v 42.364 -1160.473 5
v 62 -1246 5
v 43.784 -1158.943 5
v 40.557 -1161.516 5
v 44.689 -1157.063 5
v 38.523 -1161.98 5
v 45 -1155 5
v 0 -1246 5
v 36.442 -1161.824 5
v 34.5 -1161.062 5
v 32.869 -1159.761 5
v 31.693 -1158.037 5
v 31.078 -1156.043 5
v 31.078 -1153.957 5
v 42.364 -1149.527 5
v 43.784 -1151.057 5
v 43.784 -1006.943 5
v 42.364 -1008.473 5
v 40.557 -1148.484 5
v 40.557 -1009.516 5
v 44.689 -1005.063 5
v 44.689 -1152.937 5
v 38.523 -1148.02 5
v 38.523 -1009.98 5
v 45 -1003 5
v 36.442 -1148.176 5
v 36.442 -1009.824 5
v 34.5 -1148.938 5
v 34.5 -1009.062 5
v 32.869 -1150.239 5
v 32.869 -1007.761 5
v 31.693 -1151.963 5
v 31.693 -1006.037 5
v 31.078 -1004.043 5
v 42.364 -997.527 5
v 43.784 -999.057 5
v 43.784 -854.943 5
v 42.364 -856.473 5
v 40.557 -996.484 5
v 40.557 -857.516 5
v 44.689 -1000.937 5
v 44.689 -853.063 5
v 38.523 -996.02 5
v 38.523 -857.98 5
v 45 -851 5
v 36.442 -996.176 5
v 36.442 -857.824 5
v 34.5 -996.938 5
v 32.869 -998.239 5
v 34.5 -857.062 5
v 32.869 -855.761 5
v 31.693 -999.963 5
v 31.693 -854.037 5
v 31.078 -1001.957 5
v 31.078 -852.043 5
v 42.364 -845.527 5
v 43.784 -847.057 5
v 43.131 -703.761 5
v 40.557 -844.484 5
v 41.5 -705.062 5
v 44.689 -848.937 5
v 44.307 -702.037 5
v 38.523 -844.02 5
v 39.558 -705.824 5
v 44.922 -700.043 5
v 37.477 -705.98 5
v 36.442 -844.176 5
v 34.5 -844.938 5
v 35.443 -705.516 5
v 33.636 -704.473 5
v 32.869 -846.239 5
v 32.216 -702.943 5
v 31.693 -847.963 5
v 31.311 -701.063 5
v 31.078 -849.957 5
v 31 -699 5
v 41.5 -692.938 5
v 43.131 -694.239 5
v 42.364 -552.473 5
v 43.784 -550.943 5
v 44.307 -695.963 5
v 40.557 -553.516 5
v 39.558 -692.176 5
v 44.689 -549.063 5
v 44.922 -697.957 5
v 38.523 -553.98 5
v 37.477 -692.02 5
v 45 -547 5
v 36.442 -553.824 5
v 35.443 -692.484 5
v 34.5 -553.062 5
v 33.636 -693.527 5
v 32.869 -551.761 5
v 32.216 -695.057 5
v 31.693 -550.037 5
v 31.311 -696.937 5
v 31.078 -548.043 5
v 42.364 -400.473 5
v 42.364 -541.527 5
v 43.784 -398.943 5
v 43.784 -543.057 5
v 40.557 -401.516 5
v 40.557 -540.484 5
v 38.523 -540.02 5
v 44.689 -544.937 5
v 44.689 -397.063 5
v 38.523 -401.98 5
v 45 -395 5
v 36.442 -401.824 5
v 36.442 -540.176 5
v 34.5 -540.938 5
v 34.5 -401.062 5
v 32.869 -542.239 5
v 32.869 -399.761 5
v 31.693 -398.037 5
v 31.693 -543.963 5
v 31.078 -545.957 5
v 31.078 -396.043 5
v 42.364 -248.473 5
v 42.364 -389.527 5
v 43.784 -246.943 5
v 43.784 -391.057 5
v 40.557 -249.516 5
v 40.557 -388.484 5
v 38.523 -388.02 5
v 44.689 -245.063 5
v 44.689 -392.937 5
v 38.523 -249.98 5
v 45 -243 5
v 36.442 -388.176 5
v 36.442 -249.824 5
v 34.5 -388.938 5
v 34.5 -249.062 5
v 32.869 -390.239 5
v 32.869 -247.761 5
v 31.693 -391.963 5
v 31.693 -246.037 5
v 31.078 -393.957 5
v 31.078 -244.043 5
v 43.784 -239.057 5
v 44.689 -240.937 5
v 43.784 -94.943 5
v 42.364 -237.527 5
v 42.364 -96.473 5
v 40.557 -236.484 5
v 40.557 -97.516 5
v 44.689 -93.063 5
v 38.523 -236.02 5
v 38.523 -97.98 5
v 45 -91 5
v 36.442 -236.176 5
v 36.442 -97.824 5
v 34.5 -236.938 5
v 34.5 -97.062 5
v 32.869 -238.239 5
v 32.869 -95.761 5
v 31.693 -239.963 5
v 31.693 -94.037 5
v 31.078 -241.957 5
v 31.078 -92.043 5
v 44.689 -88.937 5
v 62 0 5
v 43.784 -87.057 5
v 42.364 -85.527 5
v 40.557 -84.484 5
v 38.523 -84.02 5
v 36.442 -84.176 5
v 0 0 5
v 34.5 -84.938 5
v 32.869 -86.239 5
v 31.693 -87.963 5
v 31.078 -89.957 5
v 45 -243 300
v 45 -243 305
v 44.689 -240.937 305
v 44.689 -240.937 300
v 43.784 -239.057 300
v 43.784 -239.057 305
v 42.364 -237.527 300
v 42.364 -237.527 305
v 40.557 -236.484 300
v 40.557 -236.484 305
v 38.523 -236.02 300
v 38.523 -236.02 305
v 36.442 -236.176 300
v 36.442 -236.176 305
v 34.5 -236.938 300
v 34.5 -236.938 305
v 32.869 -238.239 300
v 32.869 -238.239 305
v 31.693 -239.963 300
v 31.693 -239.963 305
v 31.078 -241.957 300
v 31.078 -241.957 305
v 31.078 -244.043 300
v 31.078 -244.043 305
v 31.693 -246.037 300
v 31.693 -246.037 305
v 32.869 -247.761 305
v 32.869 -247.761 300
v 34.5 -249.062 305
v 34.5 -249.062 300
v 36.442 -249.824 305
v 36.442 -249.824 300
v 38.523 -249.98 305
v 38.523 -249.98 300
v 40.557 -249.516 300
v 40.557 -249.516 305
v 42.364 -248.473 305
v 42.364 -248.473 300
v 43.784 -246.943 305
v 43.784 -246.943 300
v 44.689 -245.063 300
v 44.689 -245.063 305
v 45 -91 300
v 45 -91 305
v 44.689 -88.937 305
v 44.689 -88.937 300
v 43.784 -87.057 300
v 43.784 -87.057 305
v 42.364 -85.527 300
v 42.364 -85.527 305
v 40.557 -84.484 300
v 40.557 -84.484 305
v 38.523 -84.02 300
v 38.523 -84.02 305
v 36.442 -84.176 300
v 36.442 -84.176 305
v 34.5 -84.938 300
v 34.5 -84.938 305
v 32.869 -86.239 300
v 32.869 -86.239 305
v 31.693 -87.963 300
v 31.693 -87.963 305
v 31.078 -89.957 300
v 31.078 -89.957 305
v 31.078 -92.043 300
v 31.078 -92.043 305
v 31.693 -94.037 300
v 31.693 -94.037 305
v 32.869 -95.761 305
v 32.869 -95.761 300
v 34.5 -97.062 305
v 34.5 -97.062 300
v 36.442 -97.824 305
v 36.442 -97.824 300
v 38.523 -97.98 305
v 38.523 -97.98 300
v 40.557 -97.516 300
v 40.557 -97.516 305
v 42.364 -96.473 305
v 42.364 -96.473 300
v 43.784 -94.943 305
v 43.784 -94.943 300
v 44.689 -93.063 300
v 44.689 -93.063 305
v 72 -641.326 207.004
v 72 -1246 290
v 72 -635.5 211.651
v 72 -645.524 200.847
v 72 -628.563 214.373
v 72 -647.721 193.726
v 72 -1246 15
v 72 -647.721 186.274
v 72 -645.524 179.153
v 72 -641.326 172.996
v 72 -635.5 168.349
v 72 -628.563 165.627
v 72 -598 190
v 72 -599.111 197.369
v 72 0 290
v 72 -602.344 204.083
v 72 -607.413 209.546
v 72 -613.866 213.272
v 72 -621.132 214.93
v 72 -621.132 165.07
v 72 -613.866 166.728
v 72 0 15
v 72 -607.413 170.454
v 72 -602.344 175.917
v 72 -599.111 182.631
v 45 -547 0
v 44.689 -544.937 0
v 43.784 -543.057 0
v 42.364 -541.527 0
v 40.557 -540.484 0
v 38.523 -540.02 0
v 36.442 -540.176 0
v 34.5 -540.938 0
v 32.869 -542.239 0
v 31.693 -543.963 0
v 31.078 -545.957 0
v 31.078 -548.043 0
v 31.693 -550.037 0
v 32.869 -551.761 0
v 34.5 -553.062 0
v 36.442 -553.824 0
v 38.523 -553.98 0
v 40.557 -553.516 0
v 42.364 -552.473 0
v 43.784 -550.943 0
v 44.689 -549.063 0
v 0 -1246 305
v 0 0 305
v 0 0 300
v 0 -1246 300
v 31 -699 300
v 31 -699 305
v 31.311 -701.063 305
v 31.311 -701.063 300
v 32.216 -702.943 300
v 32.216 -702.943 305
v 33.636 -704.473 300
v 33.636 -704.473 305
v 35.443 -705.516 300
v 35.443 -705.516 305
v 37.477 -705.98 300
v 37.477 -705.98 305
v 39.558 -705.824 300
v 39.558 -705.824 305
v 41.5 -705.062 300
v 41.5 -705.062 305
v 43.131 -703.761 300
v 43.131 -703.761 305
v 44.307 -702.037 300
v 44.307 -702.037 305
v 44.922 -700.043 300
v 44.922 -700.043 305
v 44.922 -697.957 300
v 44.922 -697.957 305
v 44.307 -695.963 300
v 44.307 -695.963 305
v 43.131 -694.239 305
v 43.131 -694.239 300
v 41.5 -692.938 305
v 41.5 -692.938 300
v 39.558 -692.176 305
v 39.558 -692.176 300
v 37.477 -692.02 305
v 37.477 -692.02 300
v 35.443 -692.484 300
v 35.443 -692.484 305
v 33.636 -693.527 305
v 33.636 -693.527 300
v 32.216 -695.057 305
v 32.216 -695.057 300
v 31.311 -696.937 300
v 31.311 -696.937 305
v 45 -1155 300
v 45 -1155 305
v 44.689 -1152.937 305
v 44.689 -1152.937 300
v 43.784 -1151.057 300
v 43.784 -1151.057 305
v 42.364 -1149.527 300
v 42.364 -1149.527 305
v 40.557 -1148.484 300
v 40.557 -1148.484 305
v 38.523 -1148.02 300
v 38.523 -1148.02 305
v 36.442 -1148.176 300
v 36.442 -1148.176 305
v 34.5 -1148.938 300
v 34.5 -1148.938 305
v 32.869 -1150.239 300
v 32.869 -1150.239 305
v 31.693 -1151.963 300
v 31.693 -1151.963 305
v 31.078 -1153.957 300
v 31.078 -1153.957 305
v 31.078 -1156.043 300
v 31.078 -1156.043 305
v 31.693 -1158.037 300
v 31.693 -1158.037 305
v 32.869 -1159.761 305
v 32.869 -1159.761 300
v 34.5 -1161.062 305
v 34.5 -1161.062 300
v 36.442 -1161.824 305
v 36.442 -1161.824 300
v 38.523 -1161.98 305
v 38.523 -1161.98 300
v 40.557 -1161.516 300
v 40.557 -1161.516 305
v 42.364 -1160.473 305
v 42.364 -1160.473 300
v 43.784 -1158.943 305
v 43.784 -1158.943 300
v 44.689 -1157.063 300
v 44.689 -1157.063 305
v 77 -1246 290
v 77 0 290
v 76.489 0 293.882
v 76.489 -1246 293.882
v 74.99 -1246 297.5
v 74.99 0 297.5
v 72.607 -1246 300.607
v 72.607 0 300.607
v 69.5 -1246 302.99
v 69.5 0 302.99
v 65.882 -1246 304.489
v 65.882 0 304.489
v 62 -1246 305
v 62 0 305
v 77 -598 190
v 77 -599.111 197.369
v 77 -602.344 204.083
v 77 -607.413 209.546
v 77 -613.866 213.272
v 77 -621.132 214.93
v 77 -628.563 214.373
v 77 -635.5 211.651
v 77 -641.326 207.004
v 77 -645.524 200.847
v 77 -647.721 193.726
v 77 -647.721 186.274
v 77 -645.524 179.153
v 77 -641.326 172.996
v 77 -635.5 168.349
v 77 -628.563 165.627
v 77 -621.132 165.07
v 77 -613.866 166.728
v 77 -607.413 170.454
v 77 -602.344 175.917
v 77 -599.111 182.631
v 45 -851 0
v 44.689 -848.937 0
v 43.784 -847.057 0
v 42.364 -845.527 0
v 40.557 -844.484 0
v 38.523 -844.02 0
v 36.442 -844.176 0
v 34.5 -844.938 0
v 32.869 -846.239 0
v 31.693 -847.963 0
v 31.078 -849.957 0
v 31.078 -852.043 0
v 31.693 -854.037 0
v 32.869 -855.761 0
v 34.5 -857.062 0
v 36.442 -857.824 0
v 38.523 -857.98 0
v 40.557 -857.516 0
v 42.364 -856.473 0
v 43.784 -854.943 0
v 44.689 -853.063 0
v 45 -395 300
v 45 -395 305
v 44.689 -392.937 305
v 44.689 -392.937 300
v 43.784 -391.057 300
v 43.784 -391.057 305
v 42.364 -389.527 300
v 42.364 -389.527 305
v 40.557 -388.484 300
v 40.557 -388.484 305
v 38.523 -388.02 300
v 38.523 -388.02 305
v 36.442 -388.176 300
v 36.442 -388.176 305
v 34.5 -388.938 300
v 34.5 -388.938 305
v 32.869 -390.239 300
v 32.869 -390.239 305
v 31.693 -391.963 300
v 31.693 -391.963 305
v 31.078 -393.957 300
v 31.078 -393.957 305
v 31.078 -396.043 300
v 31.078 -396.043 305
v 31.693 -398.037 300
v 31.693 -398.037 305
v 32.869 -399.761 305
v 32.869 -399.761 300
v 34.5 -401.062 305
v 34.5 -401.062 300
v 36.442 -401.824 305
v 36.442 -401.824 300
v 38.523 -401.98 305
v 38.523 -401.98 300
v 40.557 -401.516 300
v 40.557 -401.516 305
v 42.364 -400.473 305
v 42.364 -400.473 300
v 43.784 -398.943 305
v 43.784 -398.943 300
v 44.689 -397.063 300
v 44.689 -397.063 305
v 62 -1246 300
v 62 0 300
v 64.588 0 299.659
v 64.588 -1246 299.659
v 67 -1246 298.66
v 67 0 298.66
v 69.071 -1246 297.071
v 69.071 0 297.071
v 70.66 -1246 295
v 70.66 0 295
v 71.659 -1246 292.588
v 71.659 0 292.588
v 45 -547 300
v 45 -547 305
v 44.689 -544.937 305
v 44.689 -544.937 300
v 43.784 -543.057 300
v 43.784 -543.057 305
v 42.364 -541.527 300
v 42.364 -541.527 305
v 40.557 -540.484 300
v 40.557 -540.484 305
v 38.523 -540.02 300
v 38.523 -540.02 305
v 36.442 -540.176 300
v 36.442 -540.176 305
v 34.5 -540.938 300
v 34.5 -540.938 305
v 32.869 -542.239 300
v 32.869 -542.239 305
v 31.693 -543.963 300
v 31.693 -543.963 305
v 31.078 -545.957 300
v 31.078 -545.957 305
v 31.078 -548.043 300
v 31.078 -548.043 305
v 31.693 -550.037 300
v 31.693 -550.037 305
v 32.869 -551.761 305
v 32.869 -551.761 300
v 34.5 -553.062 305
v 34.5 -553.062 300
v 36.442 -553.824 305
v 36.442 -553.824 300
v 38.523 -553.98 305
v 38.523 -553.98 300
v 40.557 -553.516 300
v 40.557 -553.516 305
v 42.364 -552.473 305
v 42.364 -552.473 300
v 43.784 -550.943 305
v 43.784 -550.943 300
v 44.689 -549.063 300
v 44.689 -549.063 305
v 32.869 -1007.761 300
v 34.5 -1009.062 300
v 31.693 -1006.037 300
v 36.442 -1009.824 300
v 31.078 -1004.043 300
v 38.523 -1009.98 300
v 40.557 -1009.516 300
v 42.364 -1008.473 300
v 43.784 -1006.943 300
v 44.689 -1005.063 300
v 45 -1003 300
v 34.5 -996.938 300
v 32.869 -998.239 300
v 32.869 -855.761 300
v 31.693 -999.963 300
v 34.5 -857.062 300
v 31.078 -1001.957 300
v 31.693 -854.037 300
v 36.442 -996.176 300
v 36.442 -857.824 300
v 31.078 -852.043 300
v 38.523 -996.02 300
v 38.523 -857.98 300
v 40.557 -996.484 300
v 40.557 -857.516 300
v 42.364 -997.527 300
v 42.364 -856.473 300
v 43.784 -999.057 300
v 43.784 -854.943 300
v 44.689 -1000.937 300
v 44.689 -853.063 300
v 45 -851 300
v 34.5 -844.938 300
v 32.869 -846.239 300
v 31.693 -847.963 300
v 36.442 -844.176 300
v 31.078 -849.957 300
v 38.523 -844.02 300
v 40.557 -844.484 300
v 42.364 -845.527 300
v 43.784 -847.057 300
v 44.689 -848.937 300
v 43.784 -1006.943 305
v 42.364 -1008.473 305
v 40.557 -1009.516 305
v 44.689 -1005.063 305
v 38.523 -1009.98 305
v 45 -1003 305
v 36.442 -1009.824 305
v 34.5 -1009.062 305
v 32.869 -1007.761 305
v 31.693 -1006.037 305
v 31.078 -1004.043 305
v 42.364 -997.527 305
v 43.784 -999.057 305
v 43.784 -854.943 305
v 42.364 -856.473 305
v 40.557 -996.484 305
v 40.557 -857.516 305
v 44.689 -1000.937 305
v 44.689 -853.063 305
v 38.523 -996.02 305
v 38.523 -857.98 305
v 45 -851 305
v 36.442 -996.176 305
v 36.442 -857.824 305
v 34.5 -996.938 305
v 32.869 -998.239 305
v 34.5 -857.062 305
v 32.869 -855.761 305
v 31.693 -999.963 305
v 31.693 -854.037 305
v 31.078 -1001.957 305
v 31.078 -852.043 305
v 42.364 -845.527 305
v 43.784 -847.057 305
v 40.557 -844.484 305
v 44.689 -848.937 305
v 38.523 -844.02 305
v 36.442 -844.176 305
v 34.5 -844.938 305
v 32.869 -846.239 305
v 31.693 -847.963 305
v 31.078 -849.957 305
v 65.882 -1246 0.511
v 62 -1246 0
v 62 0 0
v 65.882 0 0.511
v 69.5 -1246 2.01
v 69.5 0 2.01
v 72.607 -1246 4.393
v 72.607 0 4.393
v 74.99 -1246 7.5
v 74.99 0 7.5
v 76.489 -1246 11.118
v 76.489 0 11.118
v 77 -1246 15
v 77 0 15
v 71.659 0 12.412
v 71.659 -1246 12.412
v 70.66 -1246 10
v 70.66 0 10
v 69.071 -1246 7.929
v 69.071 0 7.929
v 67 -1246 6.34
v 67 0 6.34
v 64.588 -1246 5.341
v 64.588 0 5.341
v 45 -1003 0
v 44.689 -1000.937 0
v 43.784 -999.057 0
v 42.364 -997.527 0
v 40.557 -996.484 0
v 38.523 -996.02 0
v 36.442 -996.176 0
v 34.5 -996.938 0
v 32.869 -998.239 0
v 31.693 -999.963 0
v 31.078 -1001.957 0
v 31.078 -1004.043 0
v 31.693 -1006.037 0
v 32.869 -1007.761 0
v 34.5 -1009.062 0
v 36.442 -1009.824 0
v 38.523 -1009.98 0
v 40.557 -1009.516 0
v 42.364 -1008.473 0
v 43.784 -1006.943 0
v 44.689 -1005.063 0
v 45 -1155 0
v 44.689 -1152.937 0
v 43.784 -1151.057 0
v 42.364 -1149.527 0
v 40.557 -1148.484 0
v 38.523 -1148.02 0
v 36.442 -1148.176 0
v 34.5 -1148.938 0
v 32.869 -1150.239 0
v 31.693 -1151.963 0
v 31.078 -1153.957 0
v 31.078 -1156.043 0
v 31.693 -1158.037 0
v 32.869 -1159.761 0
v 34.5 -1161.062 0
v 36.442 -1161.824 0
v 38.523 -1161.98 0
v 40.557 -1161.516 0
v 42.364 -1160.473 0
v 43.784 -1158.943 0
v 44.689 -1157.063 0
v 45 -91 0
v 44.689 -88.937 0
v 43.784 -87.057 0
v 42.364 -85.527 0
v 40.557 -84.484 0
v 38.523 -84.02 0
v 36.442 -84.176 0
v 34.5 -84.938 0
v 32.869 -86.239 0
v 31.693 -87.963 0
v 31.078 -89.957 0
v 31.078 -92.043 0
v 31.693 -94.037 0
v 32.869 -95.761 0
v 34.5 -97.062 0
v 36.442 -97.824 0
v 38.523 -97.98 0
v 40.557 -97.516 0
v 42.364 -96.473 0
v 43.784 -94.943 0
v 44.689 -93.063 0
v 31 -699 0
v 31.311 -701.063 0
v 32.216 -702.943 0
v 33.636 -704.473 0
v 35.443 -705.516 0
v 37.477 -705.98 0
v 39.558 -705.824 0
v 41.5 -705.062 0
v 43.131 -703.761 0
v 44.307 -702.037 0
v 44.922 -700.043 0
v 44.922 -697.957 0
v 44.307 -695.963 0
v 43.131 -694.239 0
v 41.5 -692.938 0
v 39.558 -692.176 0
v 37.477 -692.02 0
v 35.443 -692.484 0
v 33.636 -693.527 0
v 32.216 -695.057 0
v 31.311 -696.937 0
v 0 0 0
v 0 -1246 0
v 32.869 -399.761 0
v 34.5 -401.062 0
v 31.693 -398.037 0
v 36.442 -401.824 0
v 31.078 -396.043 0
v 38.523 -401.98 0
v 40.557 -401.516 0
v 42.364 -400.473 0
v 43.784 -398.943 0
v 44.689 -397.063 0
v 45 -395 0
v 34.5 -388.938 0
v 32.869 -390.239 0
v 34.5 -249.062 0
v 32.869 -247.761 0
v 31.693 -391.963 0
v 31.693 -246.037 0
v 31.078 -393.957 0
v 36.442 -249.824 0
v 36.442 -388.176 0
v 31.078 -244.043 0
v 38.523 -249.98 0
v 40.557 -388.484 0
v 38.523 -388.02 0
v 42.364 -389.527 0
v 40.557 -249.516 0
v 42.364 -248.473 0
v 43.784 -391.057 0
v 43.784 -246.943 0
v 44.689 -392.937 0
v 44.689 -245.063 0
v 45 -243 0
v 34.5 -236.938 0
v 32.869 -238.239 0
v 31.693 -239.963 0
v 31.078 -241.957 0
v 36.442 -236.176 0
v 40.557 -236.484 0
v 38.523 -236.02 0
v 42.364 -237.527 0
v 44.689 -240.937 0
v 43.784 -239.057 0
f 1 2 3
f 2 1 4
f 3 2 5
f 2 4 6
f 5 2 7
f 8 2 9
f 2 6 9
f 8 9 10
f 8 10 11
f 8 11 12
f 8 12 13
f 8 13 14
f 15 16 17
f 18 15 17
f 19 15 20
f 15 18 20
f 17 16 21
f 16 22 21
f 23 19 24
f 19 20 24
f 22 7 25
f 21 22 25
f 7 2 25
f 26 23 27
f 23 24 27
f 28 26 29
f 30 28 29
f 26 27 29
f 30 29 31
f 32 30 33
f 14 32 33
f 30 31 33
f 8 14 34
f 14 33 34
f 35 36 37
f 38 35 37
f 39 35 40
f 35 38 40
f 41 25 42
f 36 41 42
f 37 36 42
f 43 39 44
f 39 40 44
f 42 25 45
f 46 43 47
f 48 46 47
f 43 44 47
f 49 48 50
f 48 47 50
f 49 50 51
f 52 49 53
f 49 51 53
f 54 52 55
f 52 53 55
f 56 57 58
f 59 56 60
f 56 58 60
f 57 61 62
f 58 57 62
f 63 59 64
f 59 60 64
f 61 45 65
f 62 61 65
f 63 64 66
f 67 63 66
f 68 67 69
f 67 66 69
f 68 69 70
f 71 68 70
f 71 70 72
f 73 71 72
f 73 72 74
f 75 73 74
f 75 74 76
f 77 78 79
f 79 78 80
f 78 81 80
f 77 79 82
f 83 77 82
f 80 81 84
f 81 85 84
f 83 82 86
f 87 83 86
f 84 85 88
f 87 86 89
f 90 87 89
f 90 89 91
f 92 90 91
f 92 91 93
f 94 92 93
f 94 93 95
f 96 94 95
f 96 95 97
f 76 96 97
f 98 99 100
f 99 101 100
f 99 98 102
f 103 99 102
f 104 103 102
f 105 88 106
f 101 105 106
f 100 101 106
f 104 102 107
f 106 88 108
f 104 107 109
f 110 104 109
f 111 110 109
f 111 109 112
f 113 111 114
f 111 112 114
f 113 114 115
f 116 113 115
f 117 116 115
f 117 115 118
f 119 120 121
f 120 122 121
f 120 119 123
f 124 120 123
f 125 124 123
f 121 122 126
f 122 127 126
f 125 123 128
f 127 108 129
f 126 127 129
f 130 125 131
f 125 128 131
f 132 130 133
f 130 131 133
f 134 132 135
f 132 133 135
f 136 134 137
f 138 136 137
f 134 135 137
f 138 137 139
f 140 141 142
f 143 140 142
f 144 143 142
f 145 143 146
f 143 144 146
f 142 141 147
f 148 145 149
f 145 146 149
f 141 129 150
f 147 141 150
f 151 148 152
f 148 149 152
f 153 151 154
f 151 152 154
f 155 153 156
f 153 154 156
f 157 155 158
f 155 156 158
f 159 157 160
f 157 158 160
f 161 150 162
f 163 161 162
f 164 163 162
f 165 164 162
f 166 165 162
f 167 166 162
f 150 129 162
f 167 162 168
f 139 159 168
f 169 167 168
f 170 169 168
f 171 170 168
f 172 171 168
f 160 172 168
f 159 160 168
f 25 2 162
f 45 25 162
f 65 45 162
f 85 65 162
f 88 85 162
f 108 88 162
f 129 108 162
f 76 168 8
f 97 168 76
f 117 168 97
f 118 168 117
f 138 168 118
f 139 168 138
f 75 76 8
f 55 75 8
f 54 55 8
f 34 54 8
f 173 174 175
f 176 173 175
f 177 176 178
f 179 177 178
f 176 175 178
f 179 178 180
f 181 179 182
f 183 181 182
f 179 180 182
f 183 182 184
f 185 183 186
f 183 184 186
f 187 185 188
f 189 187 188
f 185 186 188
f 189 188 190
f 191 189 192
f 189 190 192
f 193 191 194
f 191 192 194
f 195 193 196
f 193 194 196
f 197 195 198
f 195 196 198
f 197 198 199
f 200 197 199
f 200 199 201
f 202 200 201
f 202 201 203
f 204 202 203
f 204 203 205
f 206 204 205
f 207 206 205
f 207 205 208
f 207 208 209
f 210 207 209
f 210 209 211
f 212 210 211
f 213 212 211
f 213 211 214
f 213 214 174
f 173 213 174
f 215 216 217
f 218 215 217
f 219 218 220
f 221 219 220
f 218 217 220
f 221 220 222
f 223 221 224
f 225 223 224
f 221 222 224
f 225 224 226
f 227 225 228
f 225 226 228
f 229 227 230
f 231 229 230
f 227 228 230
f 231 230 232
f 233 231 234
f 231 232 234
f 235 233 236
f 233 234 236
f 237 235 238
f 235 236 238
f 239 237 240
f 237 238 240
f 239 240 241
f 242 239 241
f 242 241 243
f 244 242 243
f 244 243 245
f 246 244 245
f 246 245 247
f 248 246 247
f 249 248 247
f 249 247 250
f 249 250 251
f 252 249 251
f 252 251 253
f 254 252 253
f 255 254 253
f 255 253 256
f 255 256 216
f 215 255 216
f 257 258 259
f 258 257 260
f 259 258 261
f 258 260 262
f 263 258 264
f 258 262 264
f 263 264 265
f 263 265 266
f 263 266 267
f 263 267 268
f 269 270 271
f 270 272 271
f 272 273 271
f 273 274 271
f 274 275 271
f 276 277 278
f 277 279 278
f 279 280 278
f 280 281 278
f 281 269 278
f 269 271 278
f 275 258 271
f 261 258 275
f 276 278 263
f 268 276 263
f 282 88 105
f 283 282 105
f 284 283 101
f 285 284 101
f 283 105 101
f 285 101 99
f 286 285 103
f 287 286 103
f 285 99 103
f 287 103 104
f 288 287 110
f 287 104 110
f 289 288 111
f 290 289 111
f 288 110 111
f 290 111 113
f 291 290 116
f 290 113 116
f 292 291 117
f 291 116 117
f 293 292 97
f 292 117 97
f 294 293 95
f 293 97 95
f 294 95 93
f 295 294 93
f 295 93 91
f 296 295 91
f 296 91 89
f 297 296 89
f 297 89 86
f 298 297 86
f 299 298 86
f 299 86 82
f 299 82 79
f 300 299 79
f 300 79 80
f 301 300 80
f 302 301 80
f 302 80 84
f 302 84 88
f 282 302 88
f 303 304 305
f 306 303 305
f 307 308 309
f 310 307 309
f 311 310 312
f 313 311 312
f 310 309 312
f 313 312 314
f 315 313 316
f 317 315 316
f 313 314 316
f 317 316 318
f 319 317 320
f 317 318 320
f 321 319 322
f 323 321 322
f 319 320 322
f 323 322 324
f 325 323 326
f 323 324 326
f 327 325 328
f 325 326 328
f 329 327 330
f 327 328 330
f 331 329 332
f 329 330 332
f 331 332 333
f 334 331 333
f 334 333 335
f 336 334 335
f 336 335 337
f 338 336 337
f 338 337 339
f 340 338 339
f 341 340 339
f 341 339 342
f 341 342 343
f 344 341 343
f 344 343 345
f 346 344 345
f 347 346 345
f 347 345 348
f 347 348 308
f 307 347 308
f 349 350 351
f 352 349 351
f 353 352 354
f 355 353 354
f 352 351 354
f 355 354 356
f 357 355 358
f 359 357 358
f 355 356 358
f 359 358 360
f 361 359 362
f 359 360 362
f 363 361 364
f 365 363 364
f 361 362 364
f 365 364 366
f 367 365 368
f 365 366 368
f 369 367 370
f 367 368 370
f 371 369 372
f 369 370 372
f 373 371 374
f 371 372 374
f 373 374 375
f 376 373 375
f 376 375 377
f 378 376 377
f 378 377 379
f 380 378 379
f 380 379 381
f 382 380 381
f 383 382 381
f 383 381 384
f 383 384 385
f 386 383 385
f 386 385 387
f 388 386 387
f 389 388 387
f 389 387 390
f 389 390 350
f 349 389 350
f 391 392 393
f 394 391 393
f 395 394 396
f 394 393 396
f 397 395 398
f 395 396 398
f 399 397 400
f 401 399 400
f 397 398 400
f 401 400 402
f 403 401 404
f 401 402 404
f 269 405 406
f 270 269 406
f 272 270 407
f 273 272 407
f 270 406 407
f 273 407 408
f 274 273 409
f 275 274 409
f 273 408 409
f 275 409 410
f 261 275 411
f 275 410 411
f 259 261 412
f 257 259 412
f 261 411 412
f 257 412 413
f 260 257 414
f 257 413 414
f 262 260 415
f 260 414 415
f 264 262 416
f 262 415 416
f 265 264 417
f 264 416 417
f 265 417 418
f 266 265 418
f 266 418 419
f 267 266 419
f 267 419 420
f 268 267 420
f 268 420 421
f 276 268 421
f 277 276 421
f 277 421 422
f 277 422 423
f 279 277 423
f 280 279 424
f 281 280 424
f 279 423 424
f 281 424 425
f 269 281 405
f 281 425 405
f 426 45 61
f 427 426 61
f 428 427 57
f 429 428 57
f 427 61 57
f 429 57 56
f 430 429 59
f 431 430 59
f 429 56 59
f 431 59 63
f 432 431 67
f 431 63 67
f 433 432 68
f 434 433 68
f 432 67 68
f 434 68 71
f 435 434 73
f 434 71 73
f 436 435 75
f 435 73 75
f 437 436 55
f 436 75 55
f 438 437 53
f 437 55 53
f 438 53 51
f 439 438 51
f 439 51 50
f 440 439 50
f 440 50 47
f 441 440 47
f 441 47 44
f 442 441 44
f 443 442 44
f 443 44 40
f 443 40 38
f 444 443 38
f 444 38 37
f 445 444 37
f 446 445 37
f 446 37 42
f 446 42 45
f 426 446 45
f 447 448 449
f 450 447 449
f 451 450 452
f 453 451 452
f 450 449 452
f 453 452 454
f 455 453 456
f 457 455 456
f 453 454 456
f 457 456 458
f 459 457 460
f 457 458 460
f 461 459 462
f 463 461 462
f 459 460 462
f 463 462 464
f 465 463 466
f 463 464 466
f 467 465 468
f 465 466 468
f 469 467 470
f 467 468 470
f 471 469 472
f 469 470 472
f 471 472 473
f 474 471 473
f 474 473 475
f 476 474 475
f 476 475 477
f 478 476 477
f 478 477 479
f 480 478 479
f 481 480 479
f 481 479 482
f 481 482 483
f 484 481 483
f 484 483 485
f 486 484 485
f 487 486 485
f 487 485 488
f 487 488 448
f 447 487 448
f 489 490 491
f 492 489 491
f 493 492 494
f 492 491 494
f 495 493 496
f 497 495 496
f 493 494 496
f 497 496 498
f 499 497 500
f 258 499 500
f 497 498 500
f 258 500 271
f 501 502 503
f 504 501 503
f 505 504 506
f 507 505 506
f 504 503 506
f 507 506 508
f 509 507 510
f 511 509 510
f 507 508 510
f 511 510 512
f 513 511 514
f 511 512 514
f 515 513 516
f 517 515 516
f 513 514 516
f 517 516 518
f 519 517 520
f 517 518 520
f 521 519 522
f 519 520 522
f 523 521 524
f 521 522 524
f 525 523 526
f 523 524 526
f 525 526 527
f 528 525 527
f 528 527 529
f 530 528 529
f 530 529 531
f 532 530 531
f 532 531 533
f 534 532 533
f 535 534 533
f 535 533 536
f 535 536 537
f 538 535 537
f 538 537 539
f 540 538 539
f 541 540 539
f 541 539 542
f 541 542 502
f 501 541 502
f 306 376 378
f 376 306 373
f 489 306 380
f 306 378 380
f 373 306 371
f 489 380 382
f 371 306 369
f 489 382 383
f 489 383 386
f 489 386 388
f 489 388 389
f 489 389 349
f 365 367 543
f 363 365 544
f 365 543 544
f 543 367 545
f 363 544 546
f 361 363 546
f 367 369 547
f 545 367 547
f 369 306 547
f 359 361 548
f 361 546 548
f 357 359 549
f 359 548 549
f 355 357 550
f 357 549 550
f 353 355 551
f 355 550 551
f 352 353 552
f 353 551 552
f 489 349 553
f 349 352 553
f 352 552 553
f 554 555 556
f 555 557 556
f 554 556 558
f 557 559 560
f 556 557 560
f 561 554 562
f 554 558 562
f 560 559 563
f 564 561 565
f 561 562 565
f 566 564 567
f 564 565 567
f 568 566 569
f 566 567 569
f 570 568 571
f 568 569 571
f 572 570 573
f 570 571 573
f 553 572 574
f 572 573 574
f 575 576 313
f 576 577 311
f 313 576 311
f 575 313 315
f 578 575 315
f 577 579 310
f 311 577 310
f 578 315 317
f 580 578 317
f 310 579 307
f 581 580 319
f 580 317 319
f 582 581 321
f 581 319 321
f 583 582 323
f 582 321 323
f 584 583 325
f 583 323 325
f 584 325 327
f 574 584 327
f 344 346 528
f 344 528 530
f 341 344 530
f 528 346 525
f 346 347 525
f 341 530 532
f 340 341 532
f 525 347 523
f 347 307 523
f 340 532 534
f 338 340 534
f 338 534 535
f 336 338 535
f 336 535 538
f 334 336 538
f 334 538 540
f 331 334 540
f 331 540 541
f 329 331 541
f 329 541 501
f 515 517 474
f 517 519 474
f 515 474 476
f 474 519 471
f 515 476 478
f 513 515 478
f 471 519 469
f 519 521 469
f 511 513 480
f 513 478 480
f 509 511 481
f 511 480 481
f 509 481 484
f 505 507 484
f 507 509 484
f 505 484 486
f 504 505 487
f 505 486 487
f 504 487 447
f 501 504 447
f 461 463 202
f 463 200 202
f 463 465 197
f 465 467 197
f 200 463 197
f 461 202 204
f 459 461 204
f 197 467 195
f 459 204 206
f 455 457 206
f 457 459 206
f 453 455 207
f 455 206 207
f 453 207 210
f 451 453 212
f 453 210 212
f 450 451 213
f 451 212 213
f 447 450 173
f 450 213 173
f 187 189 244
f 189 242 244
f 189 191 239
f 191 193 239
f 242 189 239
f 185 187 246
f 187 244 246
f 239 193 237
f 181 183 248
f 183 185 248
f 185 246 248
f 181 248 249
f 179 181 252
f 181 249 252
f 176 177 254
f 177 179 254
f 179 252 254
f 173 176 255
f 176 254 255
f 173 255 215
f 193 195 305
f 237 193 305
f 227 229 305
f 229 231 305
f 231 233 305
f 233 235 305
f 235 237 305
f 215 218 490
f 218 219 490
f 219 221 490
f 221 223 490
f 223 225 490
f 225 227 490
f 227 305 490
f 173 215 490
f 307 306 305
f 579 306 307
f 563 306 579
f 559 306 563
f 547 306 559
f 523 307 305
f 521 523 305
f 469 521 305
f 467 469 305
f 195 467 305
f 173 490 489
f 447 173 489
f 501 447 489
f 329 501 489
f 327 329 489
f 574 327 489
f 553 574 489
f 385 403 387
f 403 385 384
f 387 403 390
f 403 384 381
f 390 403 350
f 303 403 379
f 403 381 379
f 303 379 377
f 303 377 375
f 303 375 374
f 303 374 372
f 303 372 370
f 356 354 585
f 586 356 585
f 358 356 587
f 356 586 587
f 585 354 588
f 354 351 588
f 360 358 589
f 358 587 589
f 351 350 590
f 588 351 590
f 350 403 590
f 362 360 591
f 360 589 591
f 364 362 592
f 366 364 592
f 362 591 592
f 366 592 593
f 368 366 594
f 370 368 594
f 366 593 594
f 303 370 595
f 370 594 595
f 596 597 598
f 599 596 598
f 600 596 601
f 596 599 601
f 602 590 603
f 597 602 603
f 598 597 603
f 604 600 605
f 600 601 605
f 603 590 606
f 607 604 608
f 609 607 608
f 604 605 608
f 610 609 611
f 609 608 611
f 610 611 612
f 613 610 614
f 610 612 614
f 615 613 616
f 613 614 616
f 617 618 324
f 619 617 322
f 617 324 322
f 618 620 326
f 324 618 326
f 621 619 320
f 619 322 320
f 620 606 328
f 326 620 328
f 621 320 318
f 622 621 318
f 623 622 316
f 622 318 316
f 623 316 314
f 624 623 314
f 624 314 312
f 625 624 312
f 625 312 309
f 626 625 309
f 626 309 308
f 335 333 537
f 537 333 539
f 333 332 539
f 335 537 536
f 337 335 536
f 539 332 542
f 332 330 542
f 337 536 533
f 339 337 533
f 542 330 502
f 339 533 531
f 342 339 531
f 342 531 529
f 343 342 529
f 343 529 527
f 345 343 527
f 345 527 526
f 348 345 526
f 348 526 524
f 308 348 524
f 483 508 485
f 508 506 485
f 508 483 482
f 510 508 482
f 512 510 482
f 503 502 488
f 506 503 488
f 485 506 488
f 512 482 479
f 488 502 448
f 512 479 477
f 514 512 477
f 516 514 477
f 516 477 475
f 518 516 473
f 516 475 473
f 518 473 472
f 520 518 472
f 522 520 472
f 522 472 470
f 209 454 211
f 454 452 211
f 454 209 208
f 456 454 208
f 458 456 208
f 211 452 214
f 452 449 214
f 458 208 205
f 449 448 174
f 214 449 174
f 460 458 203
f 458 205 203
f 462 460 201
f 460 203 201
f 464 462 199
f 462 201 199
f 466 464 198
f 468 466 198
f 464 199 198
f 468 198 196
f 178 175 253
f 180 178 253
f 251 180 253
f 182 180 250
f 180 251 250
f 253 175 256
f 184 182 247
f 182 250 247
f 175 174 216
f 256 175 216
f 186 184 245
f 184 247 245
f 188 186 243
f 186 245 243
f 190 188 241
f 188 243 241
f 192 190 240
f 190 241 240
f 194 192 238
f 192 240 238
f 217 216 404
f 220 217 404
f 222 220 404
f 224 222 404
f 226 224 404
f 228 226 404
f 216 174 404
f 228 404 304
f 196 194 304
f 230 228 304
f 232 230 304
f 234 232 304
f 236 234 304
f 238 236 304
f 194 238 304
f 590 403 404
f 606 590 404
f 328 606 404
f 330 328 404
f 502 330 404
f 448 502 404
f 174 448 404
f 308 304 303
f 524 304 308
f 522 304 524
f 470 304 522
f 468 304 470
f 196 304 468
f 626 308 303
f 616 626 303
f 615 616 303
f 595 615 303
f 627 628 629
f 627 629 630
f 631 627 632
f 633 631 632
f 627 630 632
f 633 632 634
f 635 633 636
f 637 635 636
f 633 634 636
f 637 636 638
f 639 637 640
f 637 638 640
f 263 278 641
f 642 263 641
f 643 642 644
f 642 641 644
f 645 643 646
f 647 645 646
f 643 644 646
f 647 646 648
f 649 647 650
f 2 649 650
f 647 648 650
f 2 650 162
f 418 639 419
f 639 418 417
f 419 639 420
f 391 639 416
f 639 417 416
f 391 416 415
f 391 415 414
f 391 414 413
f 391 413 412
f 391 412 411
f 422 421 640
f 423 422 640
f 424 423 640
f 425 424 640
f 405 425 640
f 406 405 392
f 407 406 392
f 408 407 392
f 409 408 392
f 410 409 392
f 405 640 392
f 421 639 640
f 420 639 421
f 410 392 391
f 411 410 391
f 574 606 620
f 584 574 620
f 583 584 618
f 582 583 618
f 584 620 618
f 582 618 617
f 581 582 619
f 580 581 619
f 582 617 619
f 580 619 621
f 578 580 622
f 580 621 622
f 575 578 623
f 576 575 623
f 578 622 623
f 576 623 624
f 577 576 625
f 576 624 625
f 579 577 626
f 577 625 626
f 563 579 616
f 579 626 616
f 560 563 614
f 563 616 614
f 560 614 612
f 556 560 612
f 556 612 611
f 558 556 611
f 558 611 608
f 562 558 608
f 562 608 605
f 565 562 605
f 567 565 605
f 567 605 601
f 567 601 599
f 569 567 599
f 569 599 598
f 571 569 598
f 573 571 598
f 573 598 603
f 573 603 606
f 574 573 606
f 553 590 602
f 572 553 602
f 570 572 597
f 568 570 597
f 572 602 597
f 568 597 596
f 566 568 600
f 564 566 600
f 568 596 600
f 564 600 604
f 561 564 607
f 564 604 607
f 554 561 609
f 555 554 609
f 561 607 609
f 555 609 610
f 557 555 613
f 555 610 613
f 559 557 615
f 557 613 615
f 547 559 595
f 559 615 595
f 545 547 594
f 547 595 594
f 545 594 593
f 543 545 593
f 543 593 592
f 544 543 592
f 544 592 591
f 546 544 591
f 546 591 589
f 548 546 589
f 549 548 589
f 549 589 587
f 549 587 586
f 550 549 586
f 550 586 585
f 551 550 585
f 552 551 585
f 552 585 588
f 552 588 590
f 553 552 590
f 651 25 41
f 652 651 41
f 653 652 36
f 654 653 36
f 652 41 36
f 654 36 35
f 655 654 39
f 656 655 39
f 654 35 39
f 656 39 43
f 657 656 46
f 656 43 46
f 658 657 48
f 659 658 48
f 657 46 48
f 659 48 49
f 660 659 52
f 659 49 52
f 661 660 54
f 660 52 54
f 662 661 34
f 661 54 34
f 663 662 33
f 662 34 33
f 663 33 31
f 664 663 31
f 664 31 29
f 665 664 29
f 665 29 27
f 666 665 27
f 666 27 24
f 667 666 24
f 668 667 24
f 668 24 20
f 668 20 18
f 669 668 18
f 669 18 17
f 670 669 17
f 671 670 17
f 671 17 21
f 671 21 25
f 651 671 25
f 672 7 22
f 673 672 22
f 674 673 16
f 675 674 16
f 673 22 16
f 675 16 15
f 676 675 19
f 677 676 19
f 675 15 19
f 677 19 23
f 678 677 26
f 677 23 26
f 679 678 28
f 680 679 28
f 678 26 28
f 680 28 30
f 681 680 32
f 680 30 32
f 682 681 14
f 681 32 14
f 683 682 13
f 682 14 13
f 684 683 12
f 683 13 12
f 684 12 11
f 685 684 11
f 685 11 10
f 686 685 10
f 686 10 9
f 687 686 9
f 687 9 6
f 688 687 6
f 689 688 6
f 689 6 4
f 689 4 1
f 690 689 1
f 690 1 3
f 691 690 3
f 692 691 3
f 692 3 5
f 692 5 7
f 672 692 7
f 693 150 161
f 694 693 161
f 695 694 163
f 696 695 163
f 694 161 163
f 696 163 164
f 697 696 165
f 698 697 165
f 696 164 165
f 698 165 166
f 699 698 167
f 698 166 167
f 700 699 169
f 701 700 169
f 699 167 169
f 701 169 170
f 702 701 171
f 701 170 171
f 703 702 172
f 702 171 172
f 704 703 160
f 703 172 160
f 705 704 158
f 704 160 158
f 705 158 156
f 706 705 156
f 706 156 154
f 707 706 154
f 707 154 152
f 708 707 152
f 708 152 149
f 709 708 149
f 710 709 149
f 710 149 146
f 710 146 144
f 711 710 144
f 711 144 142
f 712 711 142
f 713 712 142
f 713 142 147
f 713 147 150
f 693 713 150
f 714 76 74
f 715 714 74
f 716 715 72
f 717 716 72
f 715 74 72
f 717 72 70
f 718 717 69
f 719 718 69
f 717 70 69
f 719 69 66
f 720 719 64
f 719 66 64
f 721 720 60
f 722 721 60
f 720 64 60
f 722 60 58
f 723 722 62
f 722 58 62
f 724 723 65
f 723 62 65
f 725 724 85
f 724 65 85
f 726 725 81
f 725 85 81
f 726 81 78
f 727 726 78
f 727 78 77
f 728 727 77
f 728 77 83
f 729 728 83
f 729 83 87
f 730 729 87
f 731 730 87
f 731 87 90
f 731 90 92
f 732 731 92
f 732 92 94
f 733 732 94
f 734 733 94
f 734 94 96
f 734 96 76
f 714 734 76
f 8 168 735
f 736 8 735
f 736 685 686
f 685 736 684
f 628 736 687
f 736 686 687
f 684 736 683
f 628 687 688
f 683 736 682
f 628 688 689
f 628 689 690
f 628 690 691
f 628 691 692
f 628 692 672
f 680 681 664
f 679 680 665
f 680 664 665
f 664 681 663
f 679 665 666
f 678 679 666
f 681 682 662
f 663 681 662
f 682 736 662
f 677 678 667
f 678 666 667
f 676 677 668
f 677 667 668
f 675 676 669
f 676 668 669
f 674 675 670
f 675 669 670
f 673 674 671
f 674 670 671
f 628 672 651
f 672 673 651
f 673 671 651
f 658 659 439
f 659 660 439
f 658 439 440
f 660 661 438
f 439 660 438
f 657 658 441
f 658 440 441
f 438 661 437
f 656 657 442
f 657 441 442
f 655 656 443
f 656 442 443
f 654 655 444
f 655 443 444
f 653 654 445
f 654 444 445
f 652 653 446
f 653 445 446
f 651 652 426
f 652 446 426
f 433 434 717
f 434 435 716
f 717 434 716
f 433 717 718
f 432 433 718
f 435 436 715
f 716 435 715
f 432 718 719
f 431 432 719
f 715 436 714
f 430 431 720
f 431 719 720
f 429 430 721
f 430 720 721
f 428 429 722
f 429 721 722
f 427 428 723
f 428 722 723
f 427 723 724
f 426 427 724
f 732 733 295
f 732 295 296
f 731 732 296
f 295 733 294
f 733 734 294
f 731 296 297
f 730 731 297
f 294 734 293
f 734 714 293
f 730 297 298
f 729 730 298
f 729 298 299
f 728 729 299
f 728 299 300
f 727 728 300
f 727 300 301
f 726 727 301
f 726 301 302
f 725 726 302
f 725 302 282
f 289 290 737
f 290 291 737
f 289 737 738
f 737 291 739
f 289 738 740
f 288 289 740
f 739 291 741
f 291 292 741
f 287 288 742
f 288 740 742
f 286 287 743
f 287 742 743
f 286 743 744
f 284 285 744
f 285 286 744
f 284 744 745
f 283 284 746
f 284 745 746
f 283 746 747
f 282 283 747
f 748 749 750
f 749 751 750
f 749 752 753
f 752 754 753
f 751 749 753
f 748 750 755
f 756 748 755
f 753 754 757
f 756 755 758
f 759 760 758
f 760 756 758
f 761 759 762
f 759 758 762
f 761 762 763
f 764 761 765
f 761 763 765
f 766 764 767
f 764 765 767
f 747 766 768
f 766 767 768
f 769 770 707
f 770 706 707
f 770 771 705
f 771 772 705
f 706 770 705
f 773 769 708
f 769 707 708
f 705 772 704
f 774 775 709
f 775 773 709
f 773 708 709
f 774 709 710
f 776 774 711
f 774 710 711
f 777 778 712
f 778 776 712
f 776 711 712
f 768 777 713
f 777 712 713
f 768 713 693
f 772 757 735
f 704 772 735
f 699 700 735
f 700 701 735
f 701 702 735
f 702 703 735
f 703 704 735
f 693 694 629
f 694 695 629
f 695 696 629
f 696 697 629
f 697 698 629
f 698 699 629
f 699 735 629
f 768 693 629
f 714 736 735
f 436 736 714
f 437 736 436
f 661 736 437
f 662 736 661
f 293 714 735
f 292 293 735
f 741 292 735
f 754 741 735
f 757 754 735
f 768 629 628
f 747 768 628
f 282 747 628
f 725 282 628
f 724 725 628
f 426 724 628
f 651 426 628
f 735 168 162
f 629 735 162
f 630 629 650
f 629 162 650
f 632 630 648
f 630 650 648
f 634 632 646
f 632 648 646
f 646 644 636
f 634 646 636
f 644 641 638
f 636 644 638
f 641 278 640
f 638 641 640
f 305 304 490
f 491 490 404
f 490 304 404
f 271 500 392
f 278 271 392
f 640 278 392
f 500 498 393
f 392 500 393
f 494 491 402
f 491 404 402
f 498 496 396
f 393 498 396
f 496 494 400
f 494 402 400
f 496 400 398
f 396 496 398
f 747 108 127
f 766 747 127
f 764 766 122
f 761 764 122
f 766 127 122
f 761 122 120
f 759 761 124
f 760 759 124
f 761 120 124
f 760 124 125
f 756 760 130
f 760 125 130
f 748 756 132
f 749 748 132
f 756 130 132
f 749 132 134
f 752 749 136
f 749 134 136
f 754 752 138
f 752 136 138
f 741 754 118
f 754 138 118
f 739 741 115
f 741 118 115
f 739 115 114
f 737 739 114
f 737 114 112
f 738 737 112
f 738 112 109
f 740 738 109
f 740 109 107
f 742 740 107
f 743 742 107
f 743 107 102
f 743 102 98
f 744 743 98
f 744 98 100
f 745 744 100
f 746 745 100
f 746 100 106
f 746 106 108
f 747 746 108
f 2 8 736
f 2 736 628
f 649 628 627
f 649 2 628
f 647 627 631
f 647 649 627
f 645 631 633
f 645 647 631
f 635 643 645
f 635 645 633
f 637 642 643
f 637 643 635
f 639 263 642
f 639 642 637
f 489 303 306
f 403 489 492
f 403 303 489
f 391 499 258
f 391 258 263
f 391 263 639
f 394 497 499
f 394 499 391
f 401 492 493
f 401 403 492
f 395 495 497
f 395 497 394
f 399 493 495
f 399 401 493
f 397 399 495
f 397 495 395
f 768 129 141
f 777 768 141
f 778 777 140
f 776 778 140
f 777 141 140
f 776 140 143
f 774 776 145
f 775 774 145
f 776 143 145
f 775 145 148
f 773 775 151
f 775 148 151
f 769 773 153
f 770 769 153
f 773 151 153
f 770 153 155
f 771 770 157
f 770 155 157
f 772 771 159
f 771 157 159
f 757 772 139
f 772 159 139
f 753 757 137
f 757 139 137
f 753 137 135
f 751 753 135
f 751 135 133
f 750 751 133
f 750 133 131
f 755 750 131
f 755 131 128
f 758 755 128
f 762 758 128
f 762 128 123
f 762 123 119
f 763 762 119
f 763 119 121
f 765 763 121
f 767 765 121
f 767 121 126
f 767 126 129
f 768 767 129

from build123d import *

# Parameters (mm, degrees)
F1_DEPTH = 1246
F2_R     = 25
F3_DEPTH = 5
F4_R     = 7
F5_DEPTH = 305.001


with BuildPart() as f1:
    # F0 (on Front) → F1 (new body)
    with BuildSketch(Plane.XZ):
        with BuildLine():
            Line((0, 5), (0, 0))
            Line((0, 0), (62, 0))
            ThreePointArc((62, 0), (72.606602, 4.393398), (77, 15))
            Line((77, 15), (77, 290))
            ThreePointArc((77, 290), (72.606602, 300.606602), (62, 305))
            Line((62, 305), (0, 305))
            Line((0, 305), (0, 300))
            Line((0, 300), (62, 300))
            ThreePointArc((62, 300), (69.071068, 297.071068), (72, 290))
            Line((72, 290), (72, 15))
            ThreePointArc((72, 15), (69.071068, 7.928932), (62, 5))
            Line((62, 5), (0, 5))
        make_face()
    extrude(amount=F1_DEPTH)

    # F2 (on face) → F3 (cut, through all)
    with BuildSketch(Plane.YZ.offset(77)):
        with Locations((-623, 190)):
            Circle(F2_R)
    extrude(amount=-F3_DEPTH, mode=Mode.SUBTRACT)

    # F4 (on face) → F5 (cut, through all)
    with BuildSketch(Plane.XY.offset(305)):
        with Locations((38, -1155)):
            Circle(F4_R)
        with Locations((38, -1003)):
            Circle(F4_R)
        with Locations((38, -851)):
            Circle(F4_R)
        with BuildLine():
            ThreePointArc((45, -699), (38, -692), (31, -699))
            ThreePointArc((31, -699), (38, -706), (45, -699))
        make_face()
        with Locations((38, -547)):
            Circle(F4_R)
        with Locations((38, -395)):
            Circle(F4_R)
        with Locations((38, -243)):
            Circle(F4_R)
        with Locations((38, -91)):
            Circle(F4_R)
    extrude(amount=-F5_DEPTH, mode=Mode.SUBTRACT)


solid = f1.part
